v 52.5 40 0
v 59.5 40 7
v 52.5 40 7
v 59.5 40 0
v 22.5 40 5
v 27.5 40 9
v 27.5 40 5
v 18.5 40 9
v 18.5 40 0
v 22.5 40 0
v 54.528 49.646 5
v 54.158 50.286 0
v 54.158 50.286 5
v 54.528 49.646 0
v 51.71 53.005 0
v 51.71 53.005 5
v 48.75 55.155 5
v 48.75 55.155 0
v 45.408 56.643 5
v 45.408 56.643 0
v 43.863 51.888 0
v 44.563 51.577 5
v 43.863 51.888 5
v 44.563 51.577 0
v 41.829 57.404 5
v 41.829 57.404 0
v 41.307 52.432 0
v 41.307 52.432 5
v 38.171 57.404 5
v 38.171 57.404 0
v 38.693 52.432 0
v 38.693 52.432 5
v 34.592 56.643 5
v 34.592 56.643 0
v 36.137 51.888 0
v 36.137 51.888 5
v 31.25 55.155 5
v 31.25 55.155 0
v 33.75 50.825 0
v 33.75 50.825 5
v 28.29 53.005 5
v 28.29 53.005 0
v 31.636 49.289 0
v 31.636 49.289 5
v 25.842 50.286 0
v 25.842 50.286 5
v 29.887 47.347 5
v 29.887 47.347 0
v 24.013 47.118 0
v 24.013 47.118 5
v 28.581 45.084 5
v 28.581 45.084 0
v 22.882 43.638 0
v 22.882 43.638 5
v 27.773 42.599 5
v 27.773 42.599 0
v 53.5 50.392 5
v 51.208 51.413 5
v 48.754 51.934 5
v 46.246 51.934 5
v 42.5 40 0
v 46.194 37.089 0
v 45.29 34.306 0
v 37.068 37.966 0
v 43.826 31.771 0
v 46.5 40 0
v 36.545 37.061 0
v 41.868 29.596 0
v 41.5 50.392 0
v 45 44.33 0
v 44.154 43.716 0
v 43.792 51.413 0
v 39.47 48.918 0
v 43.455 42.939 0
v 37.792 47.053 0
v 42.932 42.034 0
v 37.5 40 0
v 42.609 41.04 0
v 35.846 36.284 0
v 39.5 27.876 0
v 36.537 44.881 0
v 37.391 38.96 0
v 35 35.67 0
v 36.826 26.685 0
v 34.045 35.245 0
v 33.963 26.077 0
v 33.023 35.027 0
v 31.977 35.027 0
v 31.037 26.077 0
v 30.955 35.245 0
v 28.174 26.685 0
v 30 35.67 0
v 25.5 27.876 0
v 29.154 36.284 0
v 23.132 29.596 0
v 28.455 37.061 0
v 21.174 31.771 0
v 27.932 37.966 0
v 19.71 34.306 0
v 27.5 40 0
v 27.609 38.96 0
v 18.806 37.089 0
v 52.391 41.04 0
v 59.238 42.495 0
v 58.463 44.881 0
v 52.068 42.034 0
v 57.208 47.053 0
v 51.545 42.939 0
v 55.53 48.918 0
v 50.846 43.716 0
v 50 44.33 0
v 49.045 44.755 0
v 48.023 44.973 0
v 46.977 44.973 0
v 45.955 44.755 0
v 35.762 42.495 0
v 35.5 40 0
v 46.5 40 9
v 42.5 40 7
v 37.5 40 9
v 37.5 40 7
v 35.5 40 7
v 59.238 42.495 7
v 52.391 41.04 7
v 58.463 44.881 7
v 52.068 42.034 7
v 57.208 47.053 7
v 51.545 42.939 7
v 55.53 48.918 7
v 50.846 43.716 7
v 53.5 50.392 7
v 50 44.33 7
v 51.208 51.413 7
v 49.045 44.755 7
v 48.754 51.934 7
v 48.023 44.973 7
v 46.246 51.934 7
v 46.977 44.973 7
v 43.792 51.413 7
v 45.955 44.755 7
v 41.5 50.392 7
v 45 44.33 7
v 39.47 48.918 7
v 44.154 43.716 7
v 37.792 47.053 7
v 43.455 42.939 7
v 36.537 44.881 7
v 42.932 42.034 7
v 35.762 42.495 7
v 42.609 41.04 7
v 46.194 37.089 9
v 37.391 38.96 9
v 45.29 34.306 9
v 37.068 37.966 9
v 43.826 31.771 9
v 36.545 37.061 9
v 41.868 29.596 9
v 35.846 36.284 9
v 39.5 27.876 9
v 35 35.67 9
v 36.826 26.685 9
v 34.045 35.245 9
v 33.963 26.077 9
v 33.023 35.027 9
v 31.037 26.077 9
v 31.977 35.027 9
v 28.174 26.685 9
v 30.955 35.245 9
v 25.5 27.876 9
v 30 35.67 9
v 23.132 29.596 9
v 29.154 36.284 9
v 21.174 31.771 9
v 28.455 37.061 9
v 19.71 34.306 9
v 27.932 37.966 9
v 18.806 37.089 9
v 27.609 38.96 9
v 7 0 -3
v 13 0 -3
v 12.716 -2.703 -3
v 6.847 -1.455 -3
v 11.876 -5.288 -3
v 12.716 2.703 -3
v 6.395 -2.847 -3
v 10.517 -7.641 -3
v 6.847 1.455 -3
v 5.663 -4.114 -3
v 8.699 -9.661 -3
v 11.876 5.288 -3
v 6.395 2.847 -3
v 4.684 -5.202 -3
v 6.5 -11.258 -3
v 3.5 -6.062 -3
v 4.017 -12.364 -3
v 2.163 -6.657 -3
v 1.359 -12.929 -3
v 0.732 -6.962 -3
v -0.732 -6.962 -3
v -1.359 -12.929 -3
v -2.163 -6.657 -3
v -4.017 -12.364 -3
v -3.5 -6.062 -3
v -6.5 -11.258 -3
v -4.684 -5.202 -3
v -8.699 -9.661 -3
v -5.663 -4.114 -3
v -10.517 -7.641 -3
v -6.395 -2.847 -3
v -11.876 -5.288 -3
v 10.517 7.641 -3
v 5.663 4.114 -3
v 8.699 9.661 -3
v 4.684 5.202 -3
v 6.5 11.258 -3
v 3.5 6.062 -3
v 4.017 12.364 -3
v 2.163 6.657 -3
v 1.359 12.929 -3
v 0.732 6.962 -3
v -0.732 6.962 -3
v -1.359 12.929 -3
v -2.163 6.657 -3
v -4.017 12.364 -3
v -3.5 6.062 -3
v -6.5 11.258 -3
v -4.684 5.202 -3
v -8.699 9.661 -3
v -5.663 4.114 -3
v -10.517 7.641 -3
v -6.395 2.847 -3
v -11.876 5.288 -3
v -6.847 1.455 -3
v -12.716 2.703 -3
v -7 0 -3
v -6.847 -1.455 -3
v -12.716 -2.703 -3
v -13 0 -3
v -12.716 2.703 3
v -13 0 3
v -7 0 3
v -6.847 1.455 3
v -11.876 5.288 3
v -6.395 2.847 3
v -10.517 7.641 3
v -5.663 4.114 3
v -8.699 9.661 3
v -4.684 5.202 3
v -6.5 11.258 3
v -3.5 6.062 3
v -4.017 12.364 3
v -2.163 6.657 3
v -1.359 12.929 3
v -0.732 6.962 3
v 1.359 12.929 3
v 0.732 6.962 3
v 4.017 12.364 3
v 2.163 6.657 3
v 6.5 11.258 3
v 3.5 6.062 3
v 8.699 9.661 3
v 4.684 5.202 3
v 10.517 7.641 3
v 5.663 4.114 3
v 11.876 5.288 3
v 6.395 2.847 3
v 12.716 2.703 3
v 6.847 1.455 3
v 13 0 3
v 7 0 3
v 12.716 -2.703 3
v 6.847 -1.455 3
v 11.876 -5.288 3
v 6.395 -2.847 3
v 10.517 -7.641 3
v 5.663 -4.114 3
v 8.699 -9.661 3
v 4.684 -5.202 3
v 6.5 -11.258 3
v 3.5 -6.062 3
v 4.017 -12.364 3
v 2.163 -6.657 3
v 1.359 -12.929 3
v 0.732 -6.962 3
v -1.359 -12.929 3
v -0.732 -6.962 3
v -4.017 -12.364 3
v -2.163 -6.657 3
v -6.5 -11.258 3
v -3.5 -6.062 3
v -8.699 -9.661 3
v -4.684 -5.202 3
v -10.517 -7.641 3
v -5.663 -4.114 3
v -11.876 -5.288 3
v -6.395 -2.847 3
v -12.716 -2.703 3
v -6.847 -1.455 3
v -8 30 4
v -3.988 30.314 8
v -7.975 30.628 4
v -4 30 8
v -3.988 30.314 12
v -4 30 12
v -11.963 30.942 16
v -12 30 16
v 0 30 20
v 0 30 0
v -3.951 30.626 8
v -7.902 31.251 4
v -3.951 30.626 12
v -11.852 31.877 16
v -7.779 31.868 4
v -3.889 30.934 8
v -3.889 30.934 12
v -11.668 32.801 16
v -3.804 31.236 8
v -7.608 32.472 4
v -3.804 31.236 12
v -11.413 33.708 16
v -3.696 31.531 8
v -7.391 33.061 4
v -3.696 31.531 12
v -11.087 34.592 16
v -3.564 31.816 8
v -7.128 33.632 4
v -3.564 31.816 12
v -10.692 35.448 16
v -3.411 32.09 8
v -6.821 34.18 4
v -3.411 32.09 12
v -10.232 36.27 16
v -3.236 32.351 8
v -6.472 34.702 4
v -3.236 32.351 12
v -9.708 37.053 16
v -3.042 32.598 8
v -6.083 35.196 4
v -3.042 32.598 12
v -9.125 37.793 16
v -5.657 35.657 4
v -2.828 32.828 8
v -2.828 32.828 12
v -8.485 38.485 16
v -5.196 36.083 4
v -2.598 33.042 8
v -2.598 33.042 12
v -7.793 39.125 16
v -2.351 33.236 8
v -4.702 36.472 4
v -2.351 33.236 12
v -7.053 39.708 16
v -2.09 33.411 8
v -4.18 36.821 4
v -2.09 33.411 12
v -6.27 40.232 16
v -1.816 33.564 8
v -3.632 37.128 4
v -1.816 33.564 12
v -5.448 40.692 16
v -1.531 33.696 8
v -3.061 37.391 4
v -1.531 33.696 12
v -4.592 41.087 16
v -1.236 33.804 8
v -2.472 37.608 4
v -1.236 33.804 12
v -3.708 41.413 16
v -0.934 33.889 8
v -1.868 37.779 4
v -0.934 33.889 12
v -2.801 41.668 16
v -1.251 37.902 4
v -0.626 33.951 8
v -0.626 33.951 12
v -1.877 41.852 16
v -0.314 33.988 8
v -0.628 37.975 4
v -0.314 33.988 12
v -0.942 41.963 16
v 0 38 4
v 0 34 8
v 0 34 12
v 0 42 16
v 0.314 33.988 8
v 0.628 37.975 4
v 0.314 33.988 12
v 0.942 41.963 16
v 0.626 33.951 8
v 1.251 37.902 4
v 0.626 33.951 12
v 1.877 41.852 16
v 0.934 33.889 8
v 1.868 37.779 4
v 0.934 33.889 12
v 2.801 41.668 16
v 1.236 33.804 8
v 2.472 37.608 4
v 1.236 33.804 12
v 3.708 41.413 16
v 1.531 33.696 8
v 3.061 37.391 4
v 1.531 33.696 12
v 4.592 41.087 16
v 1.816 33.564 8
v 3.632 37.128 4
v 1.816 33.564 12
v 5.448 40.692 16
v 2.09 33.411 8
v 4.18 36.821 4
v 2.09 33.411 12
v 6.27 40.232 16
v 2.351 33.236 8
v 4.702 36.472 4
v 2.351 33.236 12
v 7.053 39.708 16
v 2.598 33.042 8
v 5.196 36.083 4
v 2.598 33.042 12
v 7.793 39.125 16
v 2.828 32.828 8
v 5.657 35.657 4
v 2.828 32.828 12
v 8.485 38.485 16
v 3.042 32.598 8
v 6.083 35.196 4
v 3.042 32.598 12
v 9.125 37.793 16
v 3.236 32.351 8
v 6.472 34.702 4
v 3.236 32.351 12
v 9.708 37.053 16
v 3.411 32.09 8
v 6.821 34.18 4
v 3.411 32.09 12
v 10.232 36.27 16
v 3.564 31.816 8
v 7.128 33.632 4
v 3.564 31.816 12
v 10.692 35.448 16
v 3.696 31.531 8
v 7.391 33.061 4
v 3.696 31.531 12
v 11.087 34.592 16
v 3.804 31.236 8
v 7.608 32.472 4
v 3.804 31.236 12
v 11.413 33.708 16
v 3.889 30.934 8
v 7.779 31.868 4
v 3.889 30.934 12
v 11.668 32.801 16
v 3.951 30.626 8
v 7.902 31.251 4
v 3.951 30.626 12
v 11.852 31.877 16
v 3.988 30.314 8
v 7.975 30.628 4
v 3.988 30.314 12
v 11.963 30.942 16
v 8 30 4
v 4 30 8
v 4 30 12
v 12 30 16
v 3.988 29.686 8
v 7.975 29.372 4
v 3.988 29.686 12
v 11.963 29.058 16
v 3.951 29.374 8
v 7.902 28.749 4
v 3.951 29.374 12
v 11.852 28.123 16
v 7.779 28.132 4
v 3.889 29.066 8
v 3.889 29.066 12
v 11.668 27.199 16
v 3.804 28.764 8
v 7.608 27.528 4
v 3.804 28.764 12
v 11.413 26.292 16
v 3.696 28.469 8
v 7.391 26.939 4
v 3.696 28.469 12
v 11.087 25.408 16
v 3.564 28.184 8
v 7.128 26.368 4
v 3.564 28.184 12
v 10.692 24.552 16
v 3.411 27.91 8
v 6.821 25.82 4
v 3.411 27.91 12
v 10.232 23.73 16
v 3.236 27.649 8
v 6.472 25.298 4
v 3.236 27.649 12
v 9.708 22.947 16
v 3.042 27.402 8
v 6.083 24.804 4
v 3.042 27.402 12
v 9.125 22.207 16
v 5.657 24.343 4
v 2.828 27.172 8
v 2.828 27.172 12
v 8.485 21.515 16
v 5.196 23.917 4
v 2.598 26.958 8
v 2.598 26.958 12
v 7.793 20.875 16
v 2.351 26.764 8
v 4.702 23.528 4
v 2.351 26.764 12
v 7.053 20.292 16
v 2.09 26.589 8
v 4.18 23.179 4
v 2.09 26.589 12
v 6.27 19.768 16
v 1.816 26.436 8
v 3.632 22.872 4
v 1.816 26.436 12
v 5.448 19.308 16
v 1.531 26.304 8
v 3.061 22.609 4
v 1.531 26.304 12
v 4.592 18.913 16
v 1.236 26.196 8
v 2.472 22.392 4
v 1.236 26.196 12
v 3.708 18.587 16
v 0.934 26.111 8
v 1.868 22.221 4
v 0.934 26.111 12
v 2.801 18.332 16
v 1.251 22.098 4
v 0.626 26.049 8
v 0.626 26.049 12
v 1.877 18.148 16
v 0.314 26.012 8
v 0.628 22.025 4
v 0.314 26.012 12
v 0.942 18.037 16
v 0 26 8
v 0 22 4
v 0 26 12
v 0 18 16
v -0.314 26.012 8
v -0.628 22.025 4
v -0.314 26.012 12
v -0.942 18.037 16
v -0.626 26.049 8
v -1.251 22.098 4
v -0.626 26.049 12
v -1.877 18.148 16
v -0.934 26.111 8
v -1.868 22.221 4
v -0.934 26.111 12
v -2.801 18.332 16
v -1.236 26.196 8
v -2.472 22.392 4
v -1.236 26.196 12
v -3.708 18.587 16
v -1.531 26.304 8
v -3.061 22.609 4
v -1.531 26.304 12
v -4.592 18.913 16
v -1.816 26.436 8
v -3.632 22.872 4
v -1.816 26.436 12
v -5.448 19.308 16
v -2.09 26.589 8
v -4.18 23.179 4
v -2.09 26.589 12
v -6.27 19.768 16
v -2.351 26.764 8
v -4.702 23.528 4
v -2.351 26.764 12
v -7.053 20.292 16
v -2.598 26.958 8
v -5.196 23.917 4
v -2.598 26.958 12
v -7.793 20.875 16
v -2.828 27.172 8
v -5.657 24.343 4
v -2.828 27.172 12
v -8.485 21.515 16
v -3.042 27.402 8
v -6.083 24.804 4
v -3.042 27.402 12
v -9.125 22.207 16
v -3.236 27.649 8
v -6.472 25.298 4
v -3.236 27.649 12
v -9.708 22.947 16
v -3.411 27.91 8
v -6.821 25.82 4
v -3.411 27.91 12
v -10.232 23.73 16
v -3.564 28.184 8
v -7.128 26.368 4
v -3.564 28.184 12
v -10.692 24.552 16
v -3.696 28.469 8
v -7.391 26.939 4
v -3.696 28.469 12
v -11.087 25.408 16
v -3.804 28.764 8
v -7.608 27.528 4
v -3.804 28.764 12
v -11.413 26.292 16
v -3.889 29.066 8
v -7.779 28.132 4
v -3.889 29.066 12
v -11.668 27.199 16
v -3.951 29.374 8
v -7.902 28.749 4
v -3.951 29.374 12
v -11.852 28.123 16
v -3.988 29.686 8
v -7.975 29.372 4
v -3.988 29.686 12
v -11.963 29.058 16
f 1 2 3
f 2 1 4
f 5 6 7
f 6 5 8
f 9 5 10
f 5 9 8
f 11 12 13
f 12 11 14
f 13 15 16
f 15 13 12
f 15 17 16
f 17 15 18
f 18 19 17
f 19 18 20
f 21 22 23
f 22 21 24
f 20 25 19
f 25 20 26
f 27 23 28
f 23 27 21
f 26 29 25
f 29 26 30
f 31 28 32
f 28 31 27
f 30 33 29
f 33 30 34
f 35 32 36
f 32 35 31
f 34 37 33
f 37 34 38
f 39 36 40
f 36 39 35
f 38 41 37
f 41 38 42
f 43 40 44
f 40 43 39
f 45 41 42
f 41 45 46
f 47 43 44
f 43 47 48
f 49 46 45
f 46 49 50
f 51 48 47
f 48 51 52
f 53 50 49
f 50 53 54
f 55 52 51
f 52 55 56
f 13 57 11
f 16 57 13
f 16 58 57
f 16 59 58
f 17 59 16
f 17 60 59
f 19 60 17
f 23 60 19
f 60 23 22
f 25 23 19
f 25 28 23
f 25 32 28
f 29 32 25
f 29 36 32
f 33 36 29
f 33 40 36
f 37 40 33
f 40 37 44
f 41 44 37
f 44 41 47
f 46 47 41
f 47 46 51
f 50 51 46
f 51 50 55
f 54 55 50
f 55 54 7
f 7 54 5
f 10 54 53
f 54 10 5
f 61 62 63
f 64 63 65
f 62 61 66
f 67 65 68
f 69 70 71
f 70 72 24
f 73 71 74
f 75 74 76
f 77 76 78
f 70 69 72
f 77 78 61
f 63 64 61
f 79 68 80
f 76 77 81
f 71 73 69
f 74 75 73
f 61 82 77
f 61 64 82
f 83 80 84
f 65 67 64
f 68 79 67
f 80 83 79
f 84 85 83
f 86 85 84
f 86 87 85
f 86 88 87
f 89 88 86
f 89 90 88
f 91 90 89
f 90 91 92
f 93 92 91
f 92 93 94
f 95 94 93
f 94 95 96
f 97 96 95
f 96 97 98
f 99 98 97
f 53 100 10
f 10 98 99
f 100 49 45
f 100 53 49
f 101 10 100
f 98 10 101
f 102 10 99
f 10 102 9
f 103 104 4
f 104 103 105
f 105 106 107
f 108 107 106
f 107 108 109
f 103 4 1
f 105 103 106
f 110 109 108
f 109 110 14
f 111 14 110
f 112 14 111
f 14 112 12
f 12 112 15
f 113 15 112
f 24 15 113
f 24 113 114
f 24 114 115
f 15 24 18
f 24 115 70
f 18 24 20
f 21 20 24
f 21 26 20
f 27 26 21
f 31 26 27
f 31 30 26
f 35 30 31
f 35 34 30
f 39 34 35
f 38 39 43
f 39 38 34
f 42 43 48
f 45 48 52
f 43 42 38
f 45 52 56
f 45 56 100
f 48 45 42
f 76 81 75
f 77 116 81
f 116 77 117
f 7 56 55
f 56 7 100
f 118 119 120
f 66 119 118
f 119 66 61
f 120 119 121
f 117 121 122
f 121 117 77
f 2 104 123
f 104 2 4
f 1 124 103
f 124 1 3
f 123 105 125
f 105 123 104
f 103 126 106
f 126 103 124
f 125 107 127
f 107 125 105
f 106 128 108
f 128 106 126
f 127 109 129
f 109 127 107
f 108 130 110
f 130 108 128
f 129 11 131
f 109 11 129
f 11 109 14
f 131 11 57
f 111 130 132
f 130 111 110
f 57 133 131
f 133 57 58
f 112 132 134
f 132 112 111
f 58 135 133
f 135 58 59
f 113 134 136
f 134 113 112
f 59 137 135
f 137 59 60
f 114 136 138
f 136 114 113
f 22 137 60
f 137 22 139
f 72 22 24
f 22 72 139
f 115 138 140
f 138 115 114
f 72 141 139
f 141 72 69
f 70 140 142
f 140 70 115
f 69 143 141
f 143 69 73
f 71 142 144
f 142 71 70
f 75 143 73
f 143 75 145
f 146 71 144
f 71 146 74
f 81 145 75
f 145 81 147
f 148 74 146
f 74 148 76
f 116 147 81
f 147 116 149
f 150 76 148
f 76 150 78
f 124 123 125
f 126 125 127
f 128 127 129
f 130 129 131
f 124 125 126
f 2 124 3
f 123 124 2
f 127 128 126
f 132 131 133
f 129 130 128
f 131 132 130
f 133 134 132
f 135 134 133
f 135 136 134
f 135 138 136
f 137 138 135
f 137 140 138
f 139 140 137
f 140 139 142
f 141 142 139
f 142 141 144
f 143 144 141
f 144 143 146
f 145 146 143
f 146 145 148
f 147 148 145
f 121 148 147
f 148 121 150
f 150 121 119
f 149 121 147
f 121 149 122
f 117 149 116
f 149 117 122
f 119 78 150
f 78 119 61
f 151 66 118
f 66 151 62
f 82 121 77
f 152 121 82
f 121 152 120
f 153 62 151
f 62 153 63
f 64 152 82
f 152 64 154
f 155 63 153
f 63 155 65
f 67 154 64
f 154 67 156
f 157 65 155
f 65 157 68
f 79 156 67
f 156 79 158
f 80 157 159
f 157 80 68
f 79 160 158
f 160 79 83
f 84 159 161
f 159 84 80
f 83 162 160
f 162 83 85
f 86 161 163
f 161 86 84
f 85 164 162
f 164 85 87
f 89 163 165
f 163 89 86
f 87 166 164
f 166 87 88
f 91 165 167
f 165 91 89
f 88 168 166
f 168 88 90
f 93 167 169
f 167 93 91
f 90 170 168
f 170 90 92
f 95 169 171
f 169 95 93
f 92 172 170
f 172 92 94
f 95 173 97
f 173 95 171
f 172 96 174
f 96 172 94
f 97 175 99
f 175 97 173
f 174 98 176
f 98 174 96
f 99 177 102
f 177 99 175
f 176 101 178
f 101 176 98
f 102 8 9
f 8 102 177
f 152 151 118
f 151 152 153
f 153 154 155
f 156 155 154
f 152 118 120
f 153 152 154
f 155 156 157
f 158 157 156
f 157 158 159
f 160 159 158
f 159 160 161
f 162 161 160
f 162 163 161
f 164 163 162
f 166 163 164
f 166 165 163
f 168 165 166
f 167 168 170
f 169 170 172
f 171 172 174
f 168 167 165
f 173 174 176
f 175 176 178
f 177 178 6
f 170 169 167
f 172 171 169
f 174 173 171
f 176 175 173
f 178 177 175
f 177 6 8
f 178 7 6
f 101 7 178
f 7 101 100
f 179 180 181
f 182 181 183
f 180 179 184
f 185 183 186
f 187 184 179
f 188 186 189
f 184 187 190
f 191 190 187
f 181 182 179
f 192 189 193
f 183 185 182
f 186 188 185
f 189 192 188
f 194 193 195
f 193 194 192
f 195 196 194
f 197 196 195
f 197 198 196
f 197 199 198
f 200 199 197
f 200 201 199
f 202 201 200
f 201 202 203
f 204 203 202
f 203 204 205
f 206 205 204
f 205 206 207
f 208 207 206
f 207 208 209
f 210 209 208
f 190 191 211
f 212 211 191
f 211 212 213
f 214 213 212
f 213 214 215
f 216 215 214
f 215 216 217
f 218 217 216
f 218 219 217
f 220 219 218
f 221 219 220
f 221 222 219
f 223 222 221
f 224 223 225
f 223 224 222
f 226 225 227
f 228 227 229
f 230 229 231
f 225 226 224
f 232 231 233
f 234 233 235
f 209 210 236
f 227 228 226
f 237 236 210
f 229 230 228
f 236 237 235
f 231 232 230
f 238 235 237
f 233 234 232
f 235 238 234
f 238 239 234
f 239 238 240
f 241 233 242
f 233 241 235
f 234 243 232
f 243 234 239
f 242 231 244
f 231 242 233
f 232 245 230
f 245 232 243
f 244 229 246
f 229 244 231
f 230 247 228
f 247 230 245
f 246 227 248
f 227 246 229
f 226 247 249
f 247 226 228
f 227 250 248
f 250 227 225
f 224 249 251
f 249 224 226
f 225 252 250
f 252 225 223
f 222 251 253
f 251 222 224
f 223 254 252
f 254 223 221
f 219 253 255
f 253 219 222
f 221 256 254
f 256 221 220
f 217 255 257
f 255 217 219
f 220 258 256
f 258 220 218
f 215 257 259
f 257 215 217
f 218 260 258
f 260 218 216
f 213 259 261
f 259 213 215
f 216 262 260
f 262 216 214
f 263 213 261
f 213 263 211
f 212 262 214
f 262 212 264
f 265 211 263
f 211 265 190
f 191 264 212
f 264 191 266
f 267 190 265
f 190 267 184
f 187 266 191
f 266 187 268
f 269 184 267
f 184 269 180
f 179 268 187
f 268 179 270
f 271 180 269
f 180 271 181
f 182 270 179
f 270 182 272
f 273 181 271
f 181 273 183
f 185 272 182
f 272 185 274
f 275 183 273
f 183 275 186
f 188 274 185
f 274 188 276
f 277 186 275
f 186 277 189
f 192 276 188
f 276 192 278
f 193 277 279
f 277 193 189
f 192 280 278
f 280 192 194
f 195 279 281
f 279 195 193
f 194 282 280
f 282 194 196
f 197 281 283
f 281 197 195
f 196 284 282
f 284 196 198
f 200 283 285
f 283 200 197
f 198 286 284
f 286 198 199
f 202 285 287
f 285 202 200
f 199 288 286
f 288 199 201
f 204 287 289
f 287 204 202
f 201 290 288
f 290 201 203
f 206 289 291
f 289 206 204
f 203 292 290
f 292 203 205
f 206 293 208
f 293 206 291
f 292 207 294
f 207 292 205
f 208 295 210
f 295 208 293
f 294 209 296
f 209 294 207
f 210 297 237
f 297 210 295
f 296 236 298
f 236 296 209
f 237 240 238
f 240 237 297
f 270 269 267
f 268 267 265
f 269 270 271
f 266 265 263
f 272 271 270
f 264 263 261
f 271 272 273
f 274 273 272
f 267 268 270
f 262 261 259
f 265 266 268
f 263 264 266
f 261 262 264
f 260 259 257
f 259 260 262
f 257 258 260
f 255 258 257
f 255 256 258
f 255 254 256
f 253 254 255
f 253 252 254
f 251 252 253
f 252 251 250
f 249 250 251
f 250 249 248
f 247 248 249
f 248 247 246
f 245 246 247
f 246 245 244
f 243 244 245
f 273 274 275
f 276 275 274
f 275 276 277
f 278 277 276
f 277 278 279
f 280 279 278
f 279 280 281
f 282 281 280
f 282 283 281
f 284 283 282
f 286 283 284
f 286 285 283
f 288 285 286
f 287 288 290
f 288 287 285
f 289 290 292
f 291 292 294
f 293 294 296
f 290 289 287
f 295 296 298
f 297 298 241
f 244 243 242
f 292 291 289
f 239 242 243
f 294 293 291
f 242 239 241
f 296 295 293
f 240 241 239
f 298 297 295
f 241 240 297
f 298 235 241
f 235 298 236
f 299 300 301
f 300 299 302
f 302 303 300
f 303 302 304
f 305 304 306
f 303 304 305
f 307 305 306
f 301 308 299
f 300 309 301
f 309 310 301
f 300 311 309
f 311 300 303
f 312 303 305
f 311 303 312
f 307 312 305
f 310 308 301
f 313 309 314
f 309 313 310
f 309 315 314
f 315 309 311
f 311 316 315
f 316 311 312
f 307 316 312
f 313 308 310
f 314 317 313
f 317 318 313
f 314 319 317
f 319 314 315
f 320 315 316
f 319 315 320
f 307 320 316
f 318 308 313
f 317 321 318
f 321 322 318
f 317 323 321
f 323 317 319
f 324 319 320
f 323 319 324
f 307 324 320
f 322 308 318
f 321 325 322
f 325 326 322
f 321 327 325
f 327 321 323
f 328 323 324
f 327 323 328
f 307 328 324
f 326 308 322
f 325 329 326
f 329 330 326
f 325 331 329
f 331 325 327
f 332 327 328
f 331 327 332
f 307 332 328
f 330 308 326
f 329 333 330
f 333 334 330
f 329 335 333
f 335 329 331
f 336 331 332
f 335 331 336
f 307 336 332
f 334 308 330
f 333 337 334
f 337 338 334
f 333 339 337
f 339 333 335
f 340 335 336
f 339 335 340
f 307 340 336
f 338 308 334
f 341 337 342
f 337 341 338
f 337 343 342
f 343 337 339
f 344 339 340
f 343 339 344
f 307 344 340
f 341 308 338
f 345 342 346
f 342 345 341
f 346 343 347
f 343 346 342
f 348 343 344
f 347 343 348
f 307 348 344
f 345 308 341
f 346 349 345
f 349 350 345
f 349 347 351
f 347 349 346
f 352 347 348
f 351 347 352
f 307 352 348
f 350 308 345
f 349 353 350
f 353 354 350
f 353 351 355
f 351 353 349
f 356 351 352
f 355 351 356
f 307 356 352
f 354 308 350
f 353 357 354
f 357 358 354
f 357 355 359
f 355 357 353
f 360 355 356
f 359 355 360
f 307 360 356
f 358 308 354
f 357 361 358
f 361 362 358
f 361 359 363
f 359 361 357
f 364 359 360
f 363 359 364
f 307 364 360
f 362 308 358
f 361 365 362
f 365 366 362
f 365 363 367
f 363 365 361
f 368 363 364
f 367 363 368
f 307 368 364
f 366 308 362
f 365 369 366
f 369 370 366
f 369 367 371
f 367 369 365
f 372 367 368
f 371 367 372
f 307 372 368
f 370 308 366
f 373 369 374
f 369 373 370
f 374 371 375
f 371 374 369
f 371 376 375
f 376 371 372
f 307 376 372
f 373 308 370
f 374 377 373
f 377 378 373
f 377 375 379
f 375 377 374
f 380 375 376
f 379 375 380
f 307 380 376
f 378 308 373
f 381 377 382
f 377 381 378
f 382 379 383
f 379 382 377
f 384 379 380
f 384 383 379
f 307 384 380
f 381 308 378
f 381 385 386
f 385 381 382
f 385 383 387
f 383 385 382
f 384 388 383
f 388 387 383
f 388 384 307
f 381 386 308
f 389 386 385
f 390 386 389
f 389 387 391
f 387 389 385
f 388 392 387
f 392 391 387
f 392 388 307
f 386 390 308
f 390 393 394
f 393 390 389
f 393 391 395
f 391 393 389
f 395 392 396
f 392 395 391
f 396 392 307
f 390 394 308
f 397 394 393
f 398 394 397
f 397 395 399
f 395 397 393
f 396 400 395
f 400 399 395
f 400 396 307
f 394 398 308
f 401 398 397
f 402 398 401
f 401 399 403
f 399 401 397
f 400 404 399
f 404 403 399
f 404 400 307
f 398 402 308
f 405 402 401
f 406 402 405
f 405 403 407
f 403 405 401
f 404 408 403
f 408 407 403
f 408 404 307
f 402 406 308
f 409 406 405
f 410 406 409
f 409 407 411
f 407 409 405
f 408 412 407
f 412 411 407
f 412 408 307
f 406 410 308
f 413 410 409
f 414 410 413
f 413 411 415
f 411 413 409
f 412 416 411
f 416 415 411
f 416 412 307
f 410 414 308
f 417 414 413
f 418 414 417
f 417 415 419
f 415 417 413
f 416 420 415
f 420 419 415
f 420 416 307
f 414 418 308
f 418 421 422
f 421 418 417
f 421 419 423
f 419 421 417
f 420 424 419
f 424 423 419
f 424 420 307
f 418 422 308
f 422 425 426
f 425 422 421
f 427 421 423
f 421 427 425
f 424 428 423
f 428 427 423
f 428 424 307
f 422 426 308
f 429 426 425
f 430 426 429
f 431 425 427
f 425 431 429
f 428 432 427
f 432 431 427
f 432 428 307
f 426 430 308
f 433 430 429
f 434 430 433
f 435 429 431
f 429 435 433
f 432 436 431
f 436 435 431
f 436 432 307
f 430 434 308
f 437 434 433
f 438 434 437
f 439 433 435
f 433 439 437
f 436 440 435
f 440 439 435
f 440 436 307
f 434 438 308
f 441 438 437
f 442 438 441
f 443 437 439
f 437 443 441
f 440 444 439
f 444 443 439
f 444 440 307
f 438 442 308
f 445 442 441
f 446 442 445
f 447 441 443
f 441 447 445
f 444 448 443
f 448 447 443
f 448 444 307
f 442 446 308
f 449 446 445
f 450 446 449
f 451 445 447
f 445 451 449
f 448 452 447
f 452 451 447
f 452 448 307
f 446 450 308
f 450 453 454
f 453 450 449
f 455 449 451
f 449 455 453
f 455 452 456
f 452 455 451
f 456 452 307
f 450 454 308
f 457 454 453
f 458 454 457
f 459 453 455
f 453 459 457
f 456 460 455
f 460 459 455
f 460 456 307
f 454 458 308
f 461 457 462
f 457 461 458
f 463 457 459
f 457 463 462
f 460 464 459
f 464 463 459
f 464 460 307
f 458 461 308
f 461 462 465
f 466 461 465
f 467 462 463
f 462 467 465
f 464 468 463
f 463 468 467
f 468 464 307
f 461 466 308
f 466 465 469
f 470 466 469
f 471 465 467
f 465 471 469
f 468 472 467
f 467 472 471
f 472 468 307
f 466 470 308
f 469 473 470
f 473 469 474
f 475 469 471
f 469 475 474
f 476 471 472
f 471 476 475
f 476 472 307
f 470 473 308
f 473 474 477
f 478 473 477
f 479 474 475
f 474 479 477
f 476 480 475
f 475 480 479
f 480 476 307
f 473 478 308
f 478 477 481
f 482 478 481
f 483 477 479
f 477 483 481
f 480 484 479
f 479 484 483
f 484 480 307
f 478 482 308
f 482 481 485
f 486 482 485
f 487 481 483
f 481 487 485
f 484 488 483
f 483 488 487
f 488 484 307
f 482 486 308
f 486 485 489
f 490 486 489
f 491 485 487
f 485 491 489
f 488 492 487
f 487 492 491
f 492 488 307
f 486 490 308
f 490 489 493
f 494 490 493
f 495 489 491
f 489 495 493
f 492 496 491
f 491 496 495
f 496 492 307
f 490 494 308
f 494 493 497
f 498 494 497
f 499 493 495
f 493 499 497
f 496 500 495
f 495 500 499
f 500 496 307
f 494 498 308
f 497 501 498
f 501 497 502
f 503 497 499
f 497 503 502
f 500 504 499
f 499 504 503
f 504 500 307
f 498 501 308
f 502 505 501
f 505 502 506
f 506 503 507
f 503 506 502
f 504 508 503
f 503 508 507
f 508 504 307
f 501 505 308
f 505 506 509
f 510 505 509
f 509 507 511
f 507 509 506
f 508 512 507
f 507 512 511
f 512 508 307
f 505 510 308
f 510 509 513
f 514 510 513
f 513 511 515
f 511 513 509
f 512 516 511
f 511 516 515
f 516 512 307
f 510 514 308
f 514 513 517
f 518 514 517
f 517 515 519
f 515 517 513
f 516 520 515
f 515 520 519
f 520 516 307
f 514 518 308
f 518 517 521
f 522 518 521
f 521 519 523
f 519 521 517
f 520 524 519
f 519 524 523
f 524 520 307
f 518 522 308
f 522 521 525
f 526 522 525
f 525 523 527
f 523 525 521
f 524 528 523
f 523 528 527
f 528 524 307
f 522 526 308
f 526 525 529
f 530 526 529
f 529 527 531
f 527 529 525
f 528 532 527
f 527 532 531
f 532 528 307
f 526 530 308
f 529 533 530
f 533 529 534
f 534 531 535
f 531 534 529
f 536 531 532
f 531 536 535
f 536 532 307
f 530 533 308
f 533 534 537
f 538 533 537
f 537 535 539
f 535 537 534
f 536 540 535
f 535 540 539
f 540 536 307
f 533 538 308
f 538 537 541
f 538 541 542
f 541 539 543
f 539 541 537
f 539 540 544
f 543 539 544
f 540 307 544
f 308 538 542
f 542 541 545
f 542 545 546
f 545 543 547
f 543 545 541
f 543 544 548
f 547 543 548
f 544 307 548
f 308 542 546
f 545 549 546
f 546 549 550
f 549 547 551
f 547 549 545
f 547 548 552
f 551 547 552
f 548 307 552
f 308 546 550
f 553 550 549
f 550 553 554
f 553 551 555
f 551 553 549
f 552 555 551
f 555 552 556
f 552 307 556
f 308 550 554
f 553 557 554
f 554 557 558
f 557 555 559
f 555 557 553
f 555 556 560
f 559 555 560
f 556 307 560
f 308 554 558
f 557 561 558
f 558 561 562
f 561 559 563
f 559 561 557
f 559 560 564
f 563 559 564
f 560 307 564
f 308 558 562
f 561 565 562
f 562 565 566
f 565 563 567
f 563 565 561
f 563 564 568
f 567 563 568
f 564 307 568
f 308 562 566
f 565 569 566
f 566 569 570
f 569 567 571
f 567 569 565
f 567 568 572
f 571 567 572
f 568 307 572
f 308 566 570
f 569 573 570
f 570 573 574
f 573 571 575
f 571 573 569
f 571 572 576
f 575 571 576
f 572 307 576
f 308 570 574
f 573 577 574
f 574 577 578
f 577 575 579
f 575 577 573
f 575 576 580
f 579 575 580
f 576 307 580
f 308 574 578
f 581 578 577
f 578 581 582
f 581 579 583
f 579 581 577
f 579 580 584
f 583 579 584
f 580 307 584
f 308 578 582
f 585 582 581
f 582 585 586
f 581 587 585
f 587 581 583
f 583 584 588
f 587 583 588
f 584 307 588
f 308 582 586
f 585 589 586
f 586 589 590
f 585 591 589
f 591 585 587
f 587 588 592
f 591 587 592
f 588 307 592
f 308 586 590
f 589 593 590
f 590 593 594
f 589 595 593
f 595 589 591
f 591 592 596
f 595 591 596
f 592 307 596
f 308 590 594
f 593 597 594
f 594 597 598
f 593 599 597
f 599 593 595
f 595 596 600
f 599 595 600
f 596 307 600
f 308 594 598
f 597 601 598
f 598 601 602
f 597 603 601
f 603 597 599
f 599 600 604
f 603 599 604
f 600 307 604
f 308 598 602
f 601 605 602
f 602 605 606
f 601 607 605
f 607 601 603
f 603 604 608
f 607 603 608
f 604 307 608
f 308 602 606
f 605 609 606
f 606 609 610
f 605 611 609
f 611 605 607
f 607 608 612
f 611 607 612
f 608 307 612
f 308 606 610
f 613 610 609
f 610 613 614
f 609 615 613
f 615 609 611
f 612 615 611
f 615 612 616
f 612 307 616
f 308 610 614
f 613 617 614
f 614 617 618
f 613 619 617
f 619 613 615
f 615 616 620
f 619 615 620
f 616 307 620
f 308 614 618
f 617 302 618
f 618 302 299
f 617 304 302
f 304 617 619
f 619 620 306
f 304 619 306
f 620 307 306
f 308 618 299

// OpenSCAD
echo(version=version());

// rotate_extrude() rotates a 2D shape around the Z axis. 
// Note that the 2D shape must be either completely on the 
// positive or negative side of the X axis.
color("red")
    rotate_extrude()
        translate([10, 0])
            square(6, center=true);

// rotate_extrude() uses the global $fn/$fa/$fs settings, but
// it's possible to give a different value as parameter.
color("cyan")
    translate([40, 0, 0])
        //rotate_extrude($fn =100)
            text("  Barbara");

// Using a shape that touches the X axis is allowed and produces
// 3D objects that don't have a hole in the center.
color("green")
    translate([0, 30, 0])
        rotate_extrude($fn = 80)
            polygon( points=[[0,0],[8,4],[4,8],[4,12],[12,16],[0,20]] );


// By default rotate_extrude forms a full 360 degree circle, 
// but a partial rotation can be performed by using the angle parameter.
// Positive angles create an arc starting from the X axis, going counter-clockwise.
// Negative angles generate an arc in the clockwise direction.
color("magenta") 
  translate([40,40]){
    rotate_extrude(angle=180)
      translate([12.5,0])
        square(5);
    translate([7.5,0])
      rotate_extrude(angle=180)
        translate([5,0])
          square(7);
    translate([-7.5,0])
      rotate_extrude(angle=-180)
        translate([5,0])
          square(9);
  }


// Written in 2015 by Torsten Paul <Torsten.Paul@gmx.de>
//
// To the extent possible under law, the author(s) have dedicated all
// copyright and related and neighboring rights to this software to the
// public domain worldwide. This software is distributed without any
// warranty.
//
// You should have received a copy of the CC0 Public Domain
// Dedication along with this software.
// If not, see <http://creativecommons.org/publicdomain/zero/1.0/>.
